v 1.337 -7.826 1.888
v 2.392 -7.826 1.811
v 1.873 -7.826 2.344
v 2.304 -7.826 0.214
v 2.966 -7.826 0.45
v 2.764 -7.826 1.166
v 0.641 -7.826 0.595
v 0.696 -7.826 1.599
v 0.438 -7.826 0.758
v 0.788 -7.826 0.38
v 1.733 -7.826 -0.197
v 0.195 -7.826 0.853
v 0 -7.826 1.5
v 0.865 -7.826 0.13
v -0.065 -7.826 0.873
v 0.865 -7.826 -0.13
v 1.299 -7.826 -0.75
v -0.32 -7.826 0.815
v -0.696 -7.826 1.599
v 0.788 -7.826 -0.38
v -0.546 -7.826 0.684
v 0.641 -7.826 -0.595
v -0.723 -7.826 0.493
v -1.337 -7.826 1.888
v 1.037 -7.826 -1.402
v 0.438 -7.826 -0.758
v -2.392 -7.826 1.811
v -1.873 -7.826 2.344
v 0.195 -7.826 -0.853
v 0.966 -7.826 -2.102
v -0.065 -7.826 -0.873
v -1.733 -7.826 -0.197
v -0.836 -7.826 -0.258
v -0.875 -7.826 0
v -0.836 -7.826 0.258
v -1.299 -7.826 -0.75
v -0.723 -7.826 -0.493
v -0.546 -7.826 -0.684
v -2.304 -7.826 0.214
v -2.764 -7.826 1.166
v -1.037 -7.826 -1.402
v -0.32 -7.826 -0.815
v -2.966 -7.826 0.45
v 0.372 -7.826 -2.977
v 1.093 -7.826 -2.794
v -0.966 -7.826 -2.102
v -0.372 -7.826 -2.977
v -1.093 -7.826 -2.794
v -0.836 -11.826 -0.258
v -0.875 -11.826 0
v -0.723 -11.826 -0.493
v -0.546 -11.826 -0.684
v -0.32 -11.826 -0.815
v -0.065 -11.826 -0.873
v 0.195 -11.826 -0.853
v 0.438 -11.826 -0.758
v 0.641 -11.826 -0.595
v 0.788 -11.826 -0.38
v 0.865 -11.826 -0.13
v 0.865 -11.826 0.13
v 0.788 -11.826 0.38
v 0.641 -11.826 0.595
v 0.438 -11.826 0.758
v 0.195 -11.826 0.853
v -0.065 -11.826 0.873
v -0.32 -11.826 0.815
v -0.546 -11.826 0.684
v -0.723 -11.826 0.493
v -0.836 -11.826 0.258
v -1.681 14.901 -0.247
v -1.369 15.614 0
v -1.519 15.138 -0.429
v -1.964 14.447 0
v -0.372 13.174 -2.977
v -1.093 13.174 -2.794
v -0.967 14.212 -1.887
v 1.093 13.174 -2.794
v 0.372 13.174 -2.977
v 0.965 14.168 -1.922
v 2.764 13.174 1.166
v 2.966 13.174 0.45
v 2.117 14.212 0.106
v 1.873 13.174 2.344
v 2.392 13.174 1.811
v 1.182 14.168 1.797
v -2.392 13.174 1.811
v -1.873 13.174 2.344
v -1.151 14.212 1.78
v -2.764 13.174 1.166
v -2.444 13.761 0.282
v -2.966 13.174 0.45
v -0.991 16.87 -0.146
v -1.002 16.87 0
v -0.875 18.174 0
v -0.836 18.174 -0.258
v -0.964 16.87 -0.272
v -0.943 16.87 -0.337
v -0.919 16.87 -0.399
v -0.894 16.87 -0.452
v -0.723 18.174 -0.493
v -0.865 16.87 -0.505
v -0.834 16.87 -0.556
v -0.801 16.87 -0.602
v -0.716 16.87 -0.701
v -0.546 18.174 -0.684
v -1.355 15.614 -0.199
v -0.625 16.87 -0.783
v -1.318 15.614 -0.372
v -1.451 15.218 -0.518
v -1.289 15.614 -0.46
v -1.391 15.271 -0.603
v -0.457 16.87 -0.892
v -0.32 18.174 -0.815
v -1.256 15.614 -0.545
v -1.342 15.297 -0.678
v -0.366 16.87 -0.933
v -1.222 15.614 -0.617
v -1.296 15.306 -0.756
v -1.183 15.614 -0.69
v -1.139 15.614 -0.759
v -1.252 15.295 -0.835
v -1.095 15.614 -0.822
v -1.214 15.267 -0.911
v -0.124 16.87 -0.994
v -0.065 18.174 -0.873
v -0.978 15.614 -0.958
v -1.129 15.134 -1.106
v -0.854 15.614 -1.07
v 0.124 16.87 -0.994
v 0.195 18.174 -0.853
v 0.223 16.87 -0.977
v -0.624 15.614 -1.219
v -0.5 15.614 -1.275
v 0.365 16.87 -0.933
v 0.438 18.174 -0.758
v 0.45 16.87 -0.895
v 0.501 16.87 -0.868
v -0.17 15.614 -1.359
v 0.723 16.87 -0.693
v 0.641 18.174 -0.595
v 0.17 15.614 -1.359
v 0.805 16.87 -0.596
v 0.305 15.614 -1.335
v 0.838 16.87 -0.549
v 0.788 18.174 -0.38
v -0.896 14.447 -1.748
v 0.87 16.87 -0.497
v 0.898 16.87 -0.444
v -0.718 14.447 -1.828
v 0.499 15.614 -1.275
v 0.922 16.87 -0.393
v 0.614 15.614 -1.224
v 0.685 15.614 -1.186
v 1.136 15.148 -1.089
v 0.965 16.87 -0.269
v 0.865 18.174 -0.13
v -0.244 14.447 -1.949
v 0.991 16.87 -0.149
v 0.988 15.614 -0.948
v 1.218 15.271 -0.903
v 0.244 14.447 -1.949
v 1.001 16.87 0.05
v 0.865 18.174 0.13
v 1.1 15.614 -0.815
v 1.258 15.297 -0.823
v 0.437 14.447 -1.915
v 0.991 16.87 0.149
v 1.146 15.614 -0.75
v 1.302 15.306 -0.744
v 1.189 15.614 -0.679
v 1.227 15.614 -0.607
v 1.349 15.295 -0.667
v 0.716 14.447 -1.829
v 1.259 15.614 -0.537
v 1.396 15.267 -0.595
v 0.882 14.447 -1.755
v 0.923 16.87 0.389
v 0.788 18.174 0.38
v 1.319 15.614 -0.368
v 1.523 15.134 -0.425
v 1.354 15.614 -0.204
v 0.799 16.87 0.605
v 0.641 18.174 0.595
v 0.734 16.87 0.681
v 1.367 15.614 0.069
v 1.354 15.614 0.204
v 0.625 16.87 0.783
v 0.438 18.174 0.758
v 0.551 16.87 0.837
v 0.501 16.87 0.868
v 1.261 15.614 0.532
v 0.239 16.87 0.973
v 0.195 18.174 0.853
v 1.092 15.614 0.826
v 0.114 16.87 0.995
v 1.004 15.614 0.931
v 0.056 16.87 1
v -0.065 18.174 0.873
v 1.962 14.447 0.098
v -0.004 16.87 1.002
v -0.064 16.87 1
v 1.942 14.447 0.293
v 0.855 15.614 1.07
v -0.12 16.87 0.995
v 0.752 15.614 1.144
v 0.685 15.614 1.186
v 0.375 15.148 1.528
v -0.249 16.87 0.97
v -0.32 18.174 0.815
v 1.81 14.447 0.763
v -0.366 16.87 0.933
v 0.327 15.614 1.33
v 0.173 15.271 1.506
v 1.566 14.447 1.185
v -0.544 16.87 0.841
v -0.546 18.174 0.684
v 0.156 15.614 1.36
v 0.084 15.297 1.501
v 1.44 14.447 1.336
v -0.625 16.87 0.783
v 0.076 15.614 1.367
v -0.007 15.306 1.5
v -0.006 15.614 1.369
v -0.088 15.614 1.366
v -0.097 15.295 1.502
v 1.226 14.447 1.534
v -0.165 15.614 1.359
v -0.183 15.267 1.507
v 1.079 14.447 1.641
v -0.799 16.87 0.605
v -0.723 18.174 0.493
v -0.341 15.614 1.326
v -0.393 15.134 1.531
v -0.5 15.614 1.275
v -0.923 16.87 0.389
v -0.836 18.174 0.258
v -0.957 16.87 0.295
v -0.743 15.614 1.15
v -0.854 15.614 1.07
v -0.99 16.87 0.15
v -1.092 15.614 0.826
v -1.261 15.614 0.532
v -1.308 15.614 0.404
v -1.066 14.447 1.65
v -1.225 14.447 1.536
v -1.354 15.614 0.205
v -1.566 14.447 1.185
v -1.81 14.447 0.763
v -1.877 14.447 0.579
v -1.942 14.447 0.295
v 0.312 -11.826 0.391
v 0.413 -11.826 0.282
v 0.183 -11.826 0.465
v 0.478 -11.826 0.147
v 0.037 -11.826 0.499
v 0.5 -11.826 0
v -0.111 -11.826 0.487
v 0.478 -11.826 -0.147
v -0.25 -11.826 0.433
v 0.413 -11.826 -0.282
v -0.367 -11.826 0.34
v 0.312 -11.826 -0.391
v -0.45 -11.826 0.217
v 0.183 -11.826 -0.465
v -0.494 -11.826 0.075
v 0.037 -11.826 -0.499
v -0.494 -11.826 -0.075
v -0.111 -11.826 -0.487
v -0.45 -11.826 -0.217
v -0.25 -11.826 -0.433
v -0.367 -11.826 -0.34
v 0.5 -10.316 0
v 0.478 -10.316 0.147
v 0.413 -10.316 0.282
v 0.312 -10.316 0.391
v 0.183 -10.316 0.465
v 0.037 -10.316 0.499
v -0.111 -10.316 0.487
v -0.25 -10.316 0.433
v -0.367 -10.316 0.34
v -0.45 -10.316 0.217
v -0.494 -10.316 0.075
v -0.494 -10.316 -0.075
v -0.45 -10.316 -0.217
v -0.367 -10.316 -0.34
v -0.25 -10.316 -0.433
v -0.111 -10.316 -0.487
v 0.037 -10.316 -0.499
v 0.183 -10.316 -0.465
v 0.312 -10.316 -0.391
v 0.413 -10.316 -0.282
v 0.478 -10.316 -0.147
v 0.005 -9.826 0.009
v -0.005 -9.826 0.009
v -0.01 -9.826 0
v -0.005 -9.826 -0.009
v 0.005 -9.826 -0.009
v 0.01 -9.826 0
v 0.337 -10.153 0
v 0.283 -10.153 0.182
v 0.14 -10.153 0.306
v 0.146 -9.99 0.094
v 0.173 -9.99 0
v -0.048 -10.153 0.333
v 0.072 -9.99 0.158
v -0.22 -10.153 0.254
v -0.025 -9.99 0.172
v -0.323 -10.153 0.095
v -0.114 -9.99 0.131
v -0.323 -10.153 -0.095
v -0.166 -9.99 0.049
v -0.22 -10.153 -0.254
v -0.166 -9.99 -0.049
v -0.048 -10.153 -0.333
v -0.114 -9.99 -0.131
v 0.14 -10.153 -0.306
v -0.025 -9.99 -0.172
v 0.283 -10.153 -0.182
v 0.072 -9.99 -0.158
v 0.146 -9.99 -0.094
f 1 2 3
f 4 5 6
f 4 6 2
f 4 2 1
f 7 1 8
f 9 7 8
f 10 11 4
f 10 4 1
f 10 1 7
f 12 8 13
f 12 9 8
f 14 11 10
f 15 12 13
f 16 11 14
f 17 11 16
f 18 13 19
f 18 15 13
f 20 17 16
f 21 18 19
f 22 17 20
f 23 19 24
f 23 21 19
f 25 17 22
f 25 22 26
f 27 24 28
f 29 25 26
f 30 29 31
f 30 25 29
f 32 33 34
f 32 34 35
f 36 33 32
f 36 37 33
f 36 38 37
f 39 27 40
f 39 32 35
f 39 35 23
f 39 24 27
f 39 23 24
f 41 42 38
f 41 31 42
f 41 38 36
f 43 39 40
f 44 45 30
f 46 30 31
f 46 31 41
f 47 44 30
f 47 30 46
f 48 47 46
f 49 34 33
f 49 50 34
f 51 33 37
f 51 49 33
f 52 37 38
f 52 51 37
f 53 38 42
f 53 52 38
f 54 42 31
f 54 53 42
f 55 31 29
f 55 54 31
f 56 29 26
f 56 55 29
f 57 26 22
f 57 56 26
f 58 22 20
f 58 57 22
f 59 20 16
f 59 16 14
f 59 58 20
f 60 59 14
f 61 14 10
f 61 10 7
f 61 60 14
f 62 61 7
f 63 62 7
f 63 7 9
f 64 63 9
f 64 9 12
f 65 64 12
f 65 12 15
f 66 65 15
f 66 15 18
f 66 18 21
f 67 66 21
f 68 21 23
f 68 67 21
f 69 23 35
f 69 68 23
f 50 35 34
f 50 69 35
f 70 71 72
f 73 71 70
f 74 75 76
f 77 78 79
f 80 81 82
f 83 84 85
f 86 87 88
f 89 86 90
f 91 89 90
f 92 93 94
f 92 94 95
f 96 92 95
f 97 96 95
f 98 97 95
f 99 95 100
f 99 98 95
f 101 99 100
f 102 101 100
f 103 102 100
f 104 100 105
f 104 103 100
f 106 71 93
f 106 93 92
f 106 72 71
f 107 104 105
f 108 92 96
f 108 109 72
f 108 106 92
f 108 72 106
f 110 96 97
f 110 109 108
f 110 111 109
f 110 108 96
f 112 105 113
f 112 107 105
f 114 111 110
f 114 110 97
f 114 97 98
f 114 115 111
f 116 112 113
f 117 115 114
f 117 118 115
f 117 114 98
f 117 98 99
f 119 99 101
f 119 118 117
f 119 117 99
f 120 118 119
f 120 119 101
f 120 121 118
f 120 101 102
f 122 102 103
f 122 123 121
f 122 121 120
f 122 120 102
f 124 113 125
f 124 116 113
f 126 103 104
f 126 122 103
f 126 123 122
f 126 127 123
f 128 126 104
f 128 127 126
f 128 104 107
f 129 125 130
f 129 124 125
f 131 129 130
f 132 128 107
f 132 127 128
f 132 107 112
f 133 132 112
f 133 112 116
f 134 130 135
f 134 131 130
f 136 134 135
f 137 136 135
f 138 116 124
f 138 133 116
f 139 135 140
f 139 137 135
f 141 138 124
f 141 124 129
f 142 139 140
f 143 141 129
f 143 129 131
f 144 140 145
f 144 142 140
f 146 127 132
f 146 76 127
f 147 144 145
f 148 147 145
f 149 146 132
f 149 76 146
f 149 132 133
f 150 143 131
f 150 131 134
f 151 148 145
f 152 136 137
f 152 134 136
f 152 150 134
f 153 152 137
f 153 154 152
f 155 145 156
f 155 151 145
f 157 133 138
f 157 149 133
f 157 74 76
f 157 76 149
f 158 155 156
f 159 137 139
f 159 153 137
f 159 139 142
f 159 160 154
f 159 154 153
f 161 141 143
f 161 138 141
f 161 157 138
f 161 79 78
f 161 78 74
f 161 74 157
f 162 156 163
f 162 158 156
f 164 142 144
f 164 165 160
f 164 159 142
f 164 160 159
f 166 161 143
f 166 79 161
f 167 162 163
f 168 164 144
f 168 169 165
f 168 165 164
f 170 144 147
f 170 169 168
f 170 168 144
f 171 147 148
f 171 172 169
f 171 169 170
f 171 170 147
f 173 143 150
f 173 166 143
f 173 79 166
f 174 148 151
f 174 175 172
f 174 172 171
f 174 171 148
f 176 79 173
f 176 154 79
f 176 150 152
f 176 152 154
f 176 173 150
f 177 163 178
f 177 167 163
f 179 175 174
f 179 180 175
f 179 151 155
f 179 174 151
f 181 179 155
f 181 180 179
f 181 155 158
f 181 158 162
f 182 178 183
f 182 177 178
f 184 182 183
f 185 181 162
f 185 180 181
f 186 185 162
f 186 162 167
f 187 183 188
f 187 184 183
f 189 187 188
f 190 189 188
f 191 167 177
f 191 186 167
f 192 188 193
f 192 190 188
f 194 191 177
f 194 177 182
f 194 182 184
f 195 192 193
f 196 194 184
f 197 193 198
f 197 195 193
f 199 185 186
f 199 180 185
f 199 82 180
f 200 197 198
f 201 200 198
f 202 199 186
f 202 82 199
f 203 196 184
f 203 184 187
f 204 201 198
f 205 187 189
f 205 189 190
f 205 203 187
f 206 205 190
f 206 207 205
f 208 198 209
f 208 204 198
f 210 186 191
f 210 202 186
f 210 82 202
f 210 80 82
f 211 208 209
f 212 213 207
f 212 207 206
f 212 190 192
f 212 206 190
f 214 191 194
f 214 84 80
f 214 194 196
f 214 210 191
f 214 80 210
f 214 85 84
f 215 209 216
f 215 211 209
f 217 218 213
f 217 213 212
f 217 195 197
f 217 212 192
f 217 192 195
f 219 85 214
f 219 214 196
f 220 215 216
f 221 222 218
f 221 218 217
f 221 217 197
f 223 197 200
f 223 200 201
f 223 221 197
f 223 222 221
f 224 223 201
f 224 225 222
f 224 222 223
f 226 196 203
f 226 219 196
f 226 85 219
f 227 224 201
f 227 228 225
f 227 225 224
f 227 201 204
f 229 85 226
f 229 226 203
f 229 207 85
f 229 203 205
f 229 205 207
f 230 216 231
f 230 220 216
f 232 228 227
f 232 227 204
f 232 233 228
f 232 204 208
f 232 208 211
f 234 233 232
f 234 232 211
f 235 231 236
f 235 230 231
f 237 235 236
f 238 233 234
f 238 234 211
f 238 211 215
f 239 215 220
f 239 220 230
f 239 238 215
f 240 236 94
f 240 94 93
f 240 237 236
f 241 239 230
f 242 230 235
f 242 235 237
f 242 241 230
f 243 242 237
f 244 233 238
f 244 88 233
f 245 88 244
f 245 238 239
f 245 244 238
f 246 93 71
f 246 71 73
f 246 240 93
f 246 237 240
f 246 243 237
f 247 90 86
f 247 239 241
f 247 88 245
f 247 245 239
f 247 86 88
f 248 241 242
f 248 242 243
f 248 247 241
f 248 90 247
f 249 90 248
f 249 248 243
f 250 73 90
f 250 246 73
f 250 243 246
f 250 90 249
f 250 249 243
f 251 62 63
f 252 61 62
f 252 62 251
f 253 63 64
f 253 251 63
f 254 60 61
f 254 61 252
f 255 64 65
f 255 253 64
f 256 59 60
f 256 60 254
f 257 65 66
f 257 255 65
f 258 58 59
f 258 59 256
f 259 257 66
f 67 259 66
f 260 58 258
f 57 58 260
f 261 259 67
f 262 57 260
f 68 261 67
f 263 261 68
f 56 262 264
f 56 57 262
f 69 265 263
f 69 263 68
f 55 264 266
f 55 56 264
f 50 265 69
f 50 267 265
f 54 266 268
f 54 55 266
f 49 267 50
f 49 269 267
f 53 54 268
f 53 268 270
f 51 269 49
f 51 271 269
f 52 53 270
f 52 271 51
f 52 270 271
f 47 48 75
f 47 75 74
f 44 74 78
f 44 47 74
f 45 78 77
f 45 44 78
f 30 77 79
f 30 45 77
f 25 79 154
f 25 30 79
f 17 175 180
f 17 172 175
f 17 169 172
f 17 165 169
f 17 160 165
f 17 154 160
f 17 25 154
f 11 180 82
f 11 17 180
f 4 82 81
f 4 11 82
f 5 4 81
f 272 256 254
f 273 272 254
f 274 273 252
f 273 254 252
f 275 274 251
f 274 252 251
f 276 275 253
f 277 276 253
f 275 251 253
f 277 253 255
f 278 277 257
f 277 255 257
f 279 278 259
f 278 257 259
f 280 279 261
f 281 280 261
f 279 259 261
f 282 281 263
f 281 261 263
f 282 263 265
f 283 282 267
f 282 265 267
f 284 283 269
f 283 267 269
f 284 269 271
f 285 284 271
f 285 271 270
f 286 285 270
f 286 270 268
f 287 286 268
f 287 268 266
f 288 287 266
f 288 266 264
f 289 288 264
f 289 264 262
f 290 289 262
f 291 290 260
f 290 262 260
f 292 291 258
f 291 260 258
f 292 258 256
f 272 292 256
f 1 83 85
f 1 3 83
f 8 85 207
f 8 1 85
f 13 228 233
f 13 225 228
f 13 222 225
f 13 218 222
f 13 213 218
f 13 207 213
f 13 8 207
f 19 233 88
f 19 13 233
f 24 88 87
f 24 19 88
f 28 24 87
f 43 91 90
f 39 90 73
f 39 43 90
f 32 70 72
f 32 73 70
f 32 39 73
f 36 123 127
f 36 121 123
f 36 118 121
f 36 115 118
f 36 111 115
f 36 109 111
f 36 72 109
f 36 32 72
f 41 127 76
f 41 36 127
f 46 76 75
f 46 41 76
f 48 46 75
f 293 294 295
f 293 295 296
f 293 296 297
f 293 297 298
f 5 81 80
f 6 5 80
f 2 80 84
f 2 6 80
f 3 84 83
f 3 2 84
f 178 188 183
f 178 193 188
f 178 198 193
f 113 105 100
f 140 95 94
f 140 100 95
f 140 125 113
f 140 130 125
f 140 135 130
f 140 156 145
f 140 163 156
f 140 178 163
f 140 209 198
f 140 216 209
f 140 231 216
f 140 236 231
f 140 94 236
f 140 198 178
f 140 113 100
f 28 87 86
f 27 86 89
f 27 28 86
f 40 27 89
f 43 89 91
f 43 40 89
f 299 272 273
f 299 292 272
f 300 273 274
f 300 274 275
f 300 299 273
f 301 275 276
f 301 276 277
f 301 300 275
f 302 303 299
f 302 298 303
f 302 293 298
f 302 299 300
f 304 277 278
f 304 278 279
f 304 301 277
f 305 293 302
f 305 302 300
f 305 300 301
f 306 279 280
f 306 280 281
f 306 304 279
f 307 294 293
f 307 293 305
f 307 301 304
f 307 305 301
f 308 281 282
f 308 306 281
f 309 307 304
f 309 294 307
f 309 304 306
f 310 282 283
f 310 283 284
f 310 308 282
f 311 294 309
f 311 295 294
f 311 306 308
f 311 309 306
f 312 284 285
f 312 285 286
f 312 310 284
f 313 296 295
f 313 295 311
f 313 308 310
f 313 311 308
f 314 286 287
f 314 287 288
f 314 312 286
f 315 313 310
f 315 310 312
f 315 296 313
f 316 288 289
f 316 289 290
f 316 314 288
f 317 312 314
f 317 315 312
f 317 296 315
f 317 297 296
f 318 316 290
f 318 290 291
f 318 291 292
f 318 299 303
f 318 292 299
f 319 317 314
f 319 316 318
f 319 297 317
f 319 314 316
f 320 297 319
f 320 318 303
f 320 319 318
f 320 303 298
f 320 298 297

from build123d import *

# Parameters (mm, degrees)
CUT_EXTRUDE_1_DEPTH      = 31.298514815
CUT_EXTRUDE_1_DEPTH_BACK = 31.298514815
SKETCH_2_R               = 2.5
SKETCH_3_R               = 0.5
CUT_EXTRUDE_2_DEPTH      = 2
CHAMFER_1_SIZE           = 0.49


with BuildPart() as part:
    # Эскиз1 → Повернуть1 (revolve)
    with BuildSketch(Plane.XY):
        Polygon((0, -11.826368877), (0, 13.173631123), (-3, 13.173631123), (-3, -7.826368877), (-0.875, -7.826368877), (-0.875, -11.826368877), align=None)
        with BuildLine():
            Line((0, 13.173631123), (0, 18.173631123))
            Line((0, 18.173631123), (-0.875, 18.173631123))
            ThreePointArc((-0.875, 18.173631123), (-1.43264439, 15.459067489), (-3, 13.173631123))
            Line((-3, 13.173631123), (0, 13.173631123))
        make_face()
    revolve(axis=Axis((0, 18.173631123, 0), (0, -1, 0)))

    # Эскиз2 → Вырез-Вытянуть1 (cut, two sides: drawn at the far end of the back side and taken through both)
    with BuildSketch(Plane(origin=(0, 18.173631123, 0), x_dir=(1, 0, 0), z_dir=(0, 1, 0)).offset(-CUT_EXTRUDE_1_DEPTH_BACK)):
        with Locations((-3.464101615, 2)):
            Circle(SKETCH_2_R)
        with Locations((3.464101615, 2)):
            Circle(SKETCH_2_R)
        with Locations((0, -4)):
            Circle(SKETCH_2_R)
    extrude(amount=CUT_EXTRUDE_1_DEPTH + CUT_EXTRUDE_1_DEPTH_BACK, mode=Mode.SUBTRACT)

    # Эскиз3 → Вырез-Вытянуть2 (cut)
    with BuildSketch(Plane.XZ.offset(11.826368877)):
        Circle(SKETCH_3_R)
    extrude(amount=-CUT_EXTRUDE_2_DEPTH, mode=Mode.SUBTRACT)

    # Фаска1
    chamfer_1_edges = [part.edges().sort_by_distance(p)[0] for p in [
        (-0.5, -9.826368877, 0),
    ]]
    chamfer(chamfer_1_edges, length=CHAMFER_1_SIZE)


solid = part.part
